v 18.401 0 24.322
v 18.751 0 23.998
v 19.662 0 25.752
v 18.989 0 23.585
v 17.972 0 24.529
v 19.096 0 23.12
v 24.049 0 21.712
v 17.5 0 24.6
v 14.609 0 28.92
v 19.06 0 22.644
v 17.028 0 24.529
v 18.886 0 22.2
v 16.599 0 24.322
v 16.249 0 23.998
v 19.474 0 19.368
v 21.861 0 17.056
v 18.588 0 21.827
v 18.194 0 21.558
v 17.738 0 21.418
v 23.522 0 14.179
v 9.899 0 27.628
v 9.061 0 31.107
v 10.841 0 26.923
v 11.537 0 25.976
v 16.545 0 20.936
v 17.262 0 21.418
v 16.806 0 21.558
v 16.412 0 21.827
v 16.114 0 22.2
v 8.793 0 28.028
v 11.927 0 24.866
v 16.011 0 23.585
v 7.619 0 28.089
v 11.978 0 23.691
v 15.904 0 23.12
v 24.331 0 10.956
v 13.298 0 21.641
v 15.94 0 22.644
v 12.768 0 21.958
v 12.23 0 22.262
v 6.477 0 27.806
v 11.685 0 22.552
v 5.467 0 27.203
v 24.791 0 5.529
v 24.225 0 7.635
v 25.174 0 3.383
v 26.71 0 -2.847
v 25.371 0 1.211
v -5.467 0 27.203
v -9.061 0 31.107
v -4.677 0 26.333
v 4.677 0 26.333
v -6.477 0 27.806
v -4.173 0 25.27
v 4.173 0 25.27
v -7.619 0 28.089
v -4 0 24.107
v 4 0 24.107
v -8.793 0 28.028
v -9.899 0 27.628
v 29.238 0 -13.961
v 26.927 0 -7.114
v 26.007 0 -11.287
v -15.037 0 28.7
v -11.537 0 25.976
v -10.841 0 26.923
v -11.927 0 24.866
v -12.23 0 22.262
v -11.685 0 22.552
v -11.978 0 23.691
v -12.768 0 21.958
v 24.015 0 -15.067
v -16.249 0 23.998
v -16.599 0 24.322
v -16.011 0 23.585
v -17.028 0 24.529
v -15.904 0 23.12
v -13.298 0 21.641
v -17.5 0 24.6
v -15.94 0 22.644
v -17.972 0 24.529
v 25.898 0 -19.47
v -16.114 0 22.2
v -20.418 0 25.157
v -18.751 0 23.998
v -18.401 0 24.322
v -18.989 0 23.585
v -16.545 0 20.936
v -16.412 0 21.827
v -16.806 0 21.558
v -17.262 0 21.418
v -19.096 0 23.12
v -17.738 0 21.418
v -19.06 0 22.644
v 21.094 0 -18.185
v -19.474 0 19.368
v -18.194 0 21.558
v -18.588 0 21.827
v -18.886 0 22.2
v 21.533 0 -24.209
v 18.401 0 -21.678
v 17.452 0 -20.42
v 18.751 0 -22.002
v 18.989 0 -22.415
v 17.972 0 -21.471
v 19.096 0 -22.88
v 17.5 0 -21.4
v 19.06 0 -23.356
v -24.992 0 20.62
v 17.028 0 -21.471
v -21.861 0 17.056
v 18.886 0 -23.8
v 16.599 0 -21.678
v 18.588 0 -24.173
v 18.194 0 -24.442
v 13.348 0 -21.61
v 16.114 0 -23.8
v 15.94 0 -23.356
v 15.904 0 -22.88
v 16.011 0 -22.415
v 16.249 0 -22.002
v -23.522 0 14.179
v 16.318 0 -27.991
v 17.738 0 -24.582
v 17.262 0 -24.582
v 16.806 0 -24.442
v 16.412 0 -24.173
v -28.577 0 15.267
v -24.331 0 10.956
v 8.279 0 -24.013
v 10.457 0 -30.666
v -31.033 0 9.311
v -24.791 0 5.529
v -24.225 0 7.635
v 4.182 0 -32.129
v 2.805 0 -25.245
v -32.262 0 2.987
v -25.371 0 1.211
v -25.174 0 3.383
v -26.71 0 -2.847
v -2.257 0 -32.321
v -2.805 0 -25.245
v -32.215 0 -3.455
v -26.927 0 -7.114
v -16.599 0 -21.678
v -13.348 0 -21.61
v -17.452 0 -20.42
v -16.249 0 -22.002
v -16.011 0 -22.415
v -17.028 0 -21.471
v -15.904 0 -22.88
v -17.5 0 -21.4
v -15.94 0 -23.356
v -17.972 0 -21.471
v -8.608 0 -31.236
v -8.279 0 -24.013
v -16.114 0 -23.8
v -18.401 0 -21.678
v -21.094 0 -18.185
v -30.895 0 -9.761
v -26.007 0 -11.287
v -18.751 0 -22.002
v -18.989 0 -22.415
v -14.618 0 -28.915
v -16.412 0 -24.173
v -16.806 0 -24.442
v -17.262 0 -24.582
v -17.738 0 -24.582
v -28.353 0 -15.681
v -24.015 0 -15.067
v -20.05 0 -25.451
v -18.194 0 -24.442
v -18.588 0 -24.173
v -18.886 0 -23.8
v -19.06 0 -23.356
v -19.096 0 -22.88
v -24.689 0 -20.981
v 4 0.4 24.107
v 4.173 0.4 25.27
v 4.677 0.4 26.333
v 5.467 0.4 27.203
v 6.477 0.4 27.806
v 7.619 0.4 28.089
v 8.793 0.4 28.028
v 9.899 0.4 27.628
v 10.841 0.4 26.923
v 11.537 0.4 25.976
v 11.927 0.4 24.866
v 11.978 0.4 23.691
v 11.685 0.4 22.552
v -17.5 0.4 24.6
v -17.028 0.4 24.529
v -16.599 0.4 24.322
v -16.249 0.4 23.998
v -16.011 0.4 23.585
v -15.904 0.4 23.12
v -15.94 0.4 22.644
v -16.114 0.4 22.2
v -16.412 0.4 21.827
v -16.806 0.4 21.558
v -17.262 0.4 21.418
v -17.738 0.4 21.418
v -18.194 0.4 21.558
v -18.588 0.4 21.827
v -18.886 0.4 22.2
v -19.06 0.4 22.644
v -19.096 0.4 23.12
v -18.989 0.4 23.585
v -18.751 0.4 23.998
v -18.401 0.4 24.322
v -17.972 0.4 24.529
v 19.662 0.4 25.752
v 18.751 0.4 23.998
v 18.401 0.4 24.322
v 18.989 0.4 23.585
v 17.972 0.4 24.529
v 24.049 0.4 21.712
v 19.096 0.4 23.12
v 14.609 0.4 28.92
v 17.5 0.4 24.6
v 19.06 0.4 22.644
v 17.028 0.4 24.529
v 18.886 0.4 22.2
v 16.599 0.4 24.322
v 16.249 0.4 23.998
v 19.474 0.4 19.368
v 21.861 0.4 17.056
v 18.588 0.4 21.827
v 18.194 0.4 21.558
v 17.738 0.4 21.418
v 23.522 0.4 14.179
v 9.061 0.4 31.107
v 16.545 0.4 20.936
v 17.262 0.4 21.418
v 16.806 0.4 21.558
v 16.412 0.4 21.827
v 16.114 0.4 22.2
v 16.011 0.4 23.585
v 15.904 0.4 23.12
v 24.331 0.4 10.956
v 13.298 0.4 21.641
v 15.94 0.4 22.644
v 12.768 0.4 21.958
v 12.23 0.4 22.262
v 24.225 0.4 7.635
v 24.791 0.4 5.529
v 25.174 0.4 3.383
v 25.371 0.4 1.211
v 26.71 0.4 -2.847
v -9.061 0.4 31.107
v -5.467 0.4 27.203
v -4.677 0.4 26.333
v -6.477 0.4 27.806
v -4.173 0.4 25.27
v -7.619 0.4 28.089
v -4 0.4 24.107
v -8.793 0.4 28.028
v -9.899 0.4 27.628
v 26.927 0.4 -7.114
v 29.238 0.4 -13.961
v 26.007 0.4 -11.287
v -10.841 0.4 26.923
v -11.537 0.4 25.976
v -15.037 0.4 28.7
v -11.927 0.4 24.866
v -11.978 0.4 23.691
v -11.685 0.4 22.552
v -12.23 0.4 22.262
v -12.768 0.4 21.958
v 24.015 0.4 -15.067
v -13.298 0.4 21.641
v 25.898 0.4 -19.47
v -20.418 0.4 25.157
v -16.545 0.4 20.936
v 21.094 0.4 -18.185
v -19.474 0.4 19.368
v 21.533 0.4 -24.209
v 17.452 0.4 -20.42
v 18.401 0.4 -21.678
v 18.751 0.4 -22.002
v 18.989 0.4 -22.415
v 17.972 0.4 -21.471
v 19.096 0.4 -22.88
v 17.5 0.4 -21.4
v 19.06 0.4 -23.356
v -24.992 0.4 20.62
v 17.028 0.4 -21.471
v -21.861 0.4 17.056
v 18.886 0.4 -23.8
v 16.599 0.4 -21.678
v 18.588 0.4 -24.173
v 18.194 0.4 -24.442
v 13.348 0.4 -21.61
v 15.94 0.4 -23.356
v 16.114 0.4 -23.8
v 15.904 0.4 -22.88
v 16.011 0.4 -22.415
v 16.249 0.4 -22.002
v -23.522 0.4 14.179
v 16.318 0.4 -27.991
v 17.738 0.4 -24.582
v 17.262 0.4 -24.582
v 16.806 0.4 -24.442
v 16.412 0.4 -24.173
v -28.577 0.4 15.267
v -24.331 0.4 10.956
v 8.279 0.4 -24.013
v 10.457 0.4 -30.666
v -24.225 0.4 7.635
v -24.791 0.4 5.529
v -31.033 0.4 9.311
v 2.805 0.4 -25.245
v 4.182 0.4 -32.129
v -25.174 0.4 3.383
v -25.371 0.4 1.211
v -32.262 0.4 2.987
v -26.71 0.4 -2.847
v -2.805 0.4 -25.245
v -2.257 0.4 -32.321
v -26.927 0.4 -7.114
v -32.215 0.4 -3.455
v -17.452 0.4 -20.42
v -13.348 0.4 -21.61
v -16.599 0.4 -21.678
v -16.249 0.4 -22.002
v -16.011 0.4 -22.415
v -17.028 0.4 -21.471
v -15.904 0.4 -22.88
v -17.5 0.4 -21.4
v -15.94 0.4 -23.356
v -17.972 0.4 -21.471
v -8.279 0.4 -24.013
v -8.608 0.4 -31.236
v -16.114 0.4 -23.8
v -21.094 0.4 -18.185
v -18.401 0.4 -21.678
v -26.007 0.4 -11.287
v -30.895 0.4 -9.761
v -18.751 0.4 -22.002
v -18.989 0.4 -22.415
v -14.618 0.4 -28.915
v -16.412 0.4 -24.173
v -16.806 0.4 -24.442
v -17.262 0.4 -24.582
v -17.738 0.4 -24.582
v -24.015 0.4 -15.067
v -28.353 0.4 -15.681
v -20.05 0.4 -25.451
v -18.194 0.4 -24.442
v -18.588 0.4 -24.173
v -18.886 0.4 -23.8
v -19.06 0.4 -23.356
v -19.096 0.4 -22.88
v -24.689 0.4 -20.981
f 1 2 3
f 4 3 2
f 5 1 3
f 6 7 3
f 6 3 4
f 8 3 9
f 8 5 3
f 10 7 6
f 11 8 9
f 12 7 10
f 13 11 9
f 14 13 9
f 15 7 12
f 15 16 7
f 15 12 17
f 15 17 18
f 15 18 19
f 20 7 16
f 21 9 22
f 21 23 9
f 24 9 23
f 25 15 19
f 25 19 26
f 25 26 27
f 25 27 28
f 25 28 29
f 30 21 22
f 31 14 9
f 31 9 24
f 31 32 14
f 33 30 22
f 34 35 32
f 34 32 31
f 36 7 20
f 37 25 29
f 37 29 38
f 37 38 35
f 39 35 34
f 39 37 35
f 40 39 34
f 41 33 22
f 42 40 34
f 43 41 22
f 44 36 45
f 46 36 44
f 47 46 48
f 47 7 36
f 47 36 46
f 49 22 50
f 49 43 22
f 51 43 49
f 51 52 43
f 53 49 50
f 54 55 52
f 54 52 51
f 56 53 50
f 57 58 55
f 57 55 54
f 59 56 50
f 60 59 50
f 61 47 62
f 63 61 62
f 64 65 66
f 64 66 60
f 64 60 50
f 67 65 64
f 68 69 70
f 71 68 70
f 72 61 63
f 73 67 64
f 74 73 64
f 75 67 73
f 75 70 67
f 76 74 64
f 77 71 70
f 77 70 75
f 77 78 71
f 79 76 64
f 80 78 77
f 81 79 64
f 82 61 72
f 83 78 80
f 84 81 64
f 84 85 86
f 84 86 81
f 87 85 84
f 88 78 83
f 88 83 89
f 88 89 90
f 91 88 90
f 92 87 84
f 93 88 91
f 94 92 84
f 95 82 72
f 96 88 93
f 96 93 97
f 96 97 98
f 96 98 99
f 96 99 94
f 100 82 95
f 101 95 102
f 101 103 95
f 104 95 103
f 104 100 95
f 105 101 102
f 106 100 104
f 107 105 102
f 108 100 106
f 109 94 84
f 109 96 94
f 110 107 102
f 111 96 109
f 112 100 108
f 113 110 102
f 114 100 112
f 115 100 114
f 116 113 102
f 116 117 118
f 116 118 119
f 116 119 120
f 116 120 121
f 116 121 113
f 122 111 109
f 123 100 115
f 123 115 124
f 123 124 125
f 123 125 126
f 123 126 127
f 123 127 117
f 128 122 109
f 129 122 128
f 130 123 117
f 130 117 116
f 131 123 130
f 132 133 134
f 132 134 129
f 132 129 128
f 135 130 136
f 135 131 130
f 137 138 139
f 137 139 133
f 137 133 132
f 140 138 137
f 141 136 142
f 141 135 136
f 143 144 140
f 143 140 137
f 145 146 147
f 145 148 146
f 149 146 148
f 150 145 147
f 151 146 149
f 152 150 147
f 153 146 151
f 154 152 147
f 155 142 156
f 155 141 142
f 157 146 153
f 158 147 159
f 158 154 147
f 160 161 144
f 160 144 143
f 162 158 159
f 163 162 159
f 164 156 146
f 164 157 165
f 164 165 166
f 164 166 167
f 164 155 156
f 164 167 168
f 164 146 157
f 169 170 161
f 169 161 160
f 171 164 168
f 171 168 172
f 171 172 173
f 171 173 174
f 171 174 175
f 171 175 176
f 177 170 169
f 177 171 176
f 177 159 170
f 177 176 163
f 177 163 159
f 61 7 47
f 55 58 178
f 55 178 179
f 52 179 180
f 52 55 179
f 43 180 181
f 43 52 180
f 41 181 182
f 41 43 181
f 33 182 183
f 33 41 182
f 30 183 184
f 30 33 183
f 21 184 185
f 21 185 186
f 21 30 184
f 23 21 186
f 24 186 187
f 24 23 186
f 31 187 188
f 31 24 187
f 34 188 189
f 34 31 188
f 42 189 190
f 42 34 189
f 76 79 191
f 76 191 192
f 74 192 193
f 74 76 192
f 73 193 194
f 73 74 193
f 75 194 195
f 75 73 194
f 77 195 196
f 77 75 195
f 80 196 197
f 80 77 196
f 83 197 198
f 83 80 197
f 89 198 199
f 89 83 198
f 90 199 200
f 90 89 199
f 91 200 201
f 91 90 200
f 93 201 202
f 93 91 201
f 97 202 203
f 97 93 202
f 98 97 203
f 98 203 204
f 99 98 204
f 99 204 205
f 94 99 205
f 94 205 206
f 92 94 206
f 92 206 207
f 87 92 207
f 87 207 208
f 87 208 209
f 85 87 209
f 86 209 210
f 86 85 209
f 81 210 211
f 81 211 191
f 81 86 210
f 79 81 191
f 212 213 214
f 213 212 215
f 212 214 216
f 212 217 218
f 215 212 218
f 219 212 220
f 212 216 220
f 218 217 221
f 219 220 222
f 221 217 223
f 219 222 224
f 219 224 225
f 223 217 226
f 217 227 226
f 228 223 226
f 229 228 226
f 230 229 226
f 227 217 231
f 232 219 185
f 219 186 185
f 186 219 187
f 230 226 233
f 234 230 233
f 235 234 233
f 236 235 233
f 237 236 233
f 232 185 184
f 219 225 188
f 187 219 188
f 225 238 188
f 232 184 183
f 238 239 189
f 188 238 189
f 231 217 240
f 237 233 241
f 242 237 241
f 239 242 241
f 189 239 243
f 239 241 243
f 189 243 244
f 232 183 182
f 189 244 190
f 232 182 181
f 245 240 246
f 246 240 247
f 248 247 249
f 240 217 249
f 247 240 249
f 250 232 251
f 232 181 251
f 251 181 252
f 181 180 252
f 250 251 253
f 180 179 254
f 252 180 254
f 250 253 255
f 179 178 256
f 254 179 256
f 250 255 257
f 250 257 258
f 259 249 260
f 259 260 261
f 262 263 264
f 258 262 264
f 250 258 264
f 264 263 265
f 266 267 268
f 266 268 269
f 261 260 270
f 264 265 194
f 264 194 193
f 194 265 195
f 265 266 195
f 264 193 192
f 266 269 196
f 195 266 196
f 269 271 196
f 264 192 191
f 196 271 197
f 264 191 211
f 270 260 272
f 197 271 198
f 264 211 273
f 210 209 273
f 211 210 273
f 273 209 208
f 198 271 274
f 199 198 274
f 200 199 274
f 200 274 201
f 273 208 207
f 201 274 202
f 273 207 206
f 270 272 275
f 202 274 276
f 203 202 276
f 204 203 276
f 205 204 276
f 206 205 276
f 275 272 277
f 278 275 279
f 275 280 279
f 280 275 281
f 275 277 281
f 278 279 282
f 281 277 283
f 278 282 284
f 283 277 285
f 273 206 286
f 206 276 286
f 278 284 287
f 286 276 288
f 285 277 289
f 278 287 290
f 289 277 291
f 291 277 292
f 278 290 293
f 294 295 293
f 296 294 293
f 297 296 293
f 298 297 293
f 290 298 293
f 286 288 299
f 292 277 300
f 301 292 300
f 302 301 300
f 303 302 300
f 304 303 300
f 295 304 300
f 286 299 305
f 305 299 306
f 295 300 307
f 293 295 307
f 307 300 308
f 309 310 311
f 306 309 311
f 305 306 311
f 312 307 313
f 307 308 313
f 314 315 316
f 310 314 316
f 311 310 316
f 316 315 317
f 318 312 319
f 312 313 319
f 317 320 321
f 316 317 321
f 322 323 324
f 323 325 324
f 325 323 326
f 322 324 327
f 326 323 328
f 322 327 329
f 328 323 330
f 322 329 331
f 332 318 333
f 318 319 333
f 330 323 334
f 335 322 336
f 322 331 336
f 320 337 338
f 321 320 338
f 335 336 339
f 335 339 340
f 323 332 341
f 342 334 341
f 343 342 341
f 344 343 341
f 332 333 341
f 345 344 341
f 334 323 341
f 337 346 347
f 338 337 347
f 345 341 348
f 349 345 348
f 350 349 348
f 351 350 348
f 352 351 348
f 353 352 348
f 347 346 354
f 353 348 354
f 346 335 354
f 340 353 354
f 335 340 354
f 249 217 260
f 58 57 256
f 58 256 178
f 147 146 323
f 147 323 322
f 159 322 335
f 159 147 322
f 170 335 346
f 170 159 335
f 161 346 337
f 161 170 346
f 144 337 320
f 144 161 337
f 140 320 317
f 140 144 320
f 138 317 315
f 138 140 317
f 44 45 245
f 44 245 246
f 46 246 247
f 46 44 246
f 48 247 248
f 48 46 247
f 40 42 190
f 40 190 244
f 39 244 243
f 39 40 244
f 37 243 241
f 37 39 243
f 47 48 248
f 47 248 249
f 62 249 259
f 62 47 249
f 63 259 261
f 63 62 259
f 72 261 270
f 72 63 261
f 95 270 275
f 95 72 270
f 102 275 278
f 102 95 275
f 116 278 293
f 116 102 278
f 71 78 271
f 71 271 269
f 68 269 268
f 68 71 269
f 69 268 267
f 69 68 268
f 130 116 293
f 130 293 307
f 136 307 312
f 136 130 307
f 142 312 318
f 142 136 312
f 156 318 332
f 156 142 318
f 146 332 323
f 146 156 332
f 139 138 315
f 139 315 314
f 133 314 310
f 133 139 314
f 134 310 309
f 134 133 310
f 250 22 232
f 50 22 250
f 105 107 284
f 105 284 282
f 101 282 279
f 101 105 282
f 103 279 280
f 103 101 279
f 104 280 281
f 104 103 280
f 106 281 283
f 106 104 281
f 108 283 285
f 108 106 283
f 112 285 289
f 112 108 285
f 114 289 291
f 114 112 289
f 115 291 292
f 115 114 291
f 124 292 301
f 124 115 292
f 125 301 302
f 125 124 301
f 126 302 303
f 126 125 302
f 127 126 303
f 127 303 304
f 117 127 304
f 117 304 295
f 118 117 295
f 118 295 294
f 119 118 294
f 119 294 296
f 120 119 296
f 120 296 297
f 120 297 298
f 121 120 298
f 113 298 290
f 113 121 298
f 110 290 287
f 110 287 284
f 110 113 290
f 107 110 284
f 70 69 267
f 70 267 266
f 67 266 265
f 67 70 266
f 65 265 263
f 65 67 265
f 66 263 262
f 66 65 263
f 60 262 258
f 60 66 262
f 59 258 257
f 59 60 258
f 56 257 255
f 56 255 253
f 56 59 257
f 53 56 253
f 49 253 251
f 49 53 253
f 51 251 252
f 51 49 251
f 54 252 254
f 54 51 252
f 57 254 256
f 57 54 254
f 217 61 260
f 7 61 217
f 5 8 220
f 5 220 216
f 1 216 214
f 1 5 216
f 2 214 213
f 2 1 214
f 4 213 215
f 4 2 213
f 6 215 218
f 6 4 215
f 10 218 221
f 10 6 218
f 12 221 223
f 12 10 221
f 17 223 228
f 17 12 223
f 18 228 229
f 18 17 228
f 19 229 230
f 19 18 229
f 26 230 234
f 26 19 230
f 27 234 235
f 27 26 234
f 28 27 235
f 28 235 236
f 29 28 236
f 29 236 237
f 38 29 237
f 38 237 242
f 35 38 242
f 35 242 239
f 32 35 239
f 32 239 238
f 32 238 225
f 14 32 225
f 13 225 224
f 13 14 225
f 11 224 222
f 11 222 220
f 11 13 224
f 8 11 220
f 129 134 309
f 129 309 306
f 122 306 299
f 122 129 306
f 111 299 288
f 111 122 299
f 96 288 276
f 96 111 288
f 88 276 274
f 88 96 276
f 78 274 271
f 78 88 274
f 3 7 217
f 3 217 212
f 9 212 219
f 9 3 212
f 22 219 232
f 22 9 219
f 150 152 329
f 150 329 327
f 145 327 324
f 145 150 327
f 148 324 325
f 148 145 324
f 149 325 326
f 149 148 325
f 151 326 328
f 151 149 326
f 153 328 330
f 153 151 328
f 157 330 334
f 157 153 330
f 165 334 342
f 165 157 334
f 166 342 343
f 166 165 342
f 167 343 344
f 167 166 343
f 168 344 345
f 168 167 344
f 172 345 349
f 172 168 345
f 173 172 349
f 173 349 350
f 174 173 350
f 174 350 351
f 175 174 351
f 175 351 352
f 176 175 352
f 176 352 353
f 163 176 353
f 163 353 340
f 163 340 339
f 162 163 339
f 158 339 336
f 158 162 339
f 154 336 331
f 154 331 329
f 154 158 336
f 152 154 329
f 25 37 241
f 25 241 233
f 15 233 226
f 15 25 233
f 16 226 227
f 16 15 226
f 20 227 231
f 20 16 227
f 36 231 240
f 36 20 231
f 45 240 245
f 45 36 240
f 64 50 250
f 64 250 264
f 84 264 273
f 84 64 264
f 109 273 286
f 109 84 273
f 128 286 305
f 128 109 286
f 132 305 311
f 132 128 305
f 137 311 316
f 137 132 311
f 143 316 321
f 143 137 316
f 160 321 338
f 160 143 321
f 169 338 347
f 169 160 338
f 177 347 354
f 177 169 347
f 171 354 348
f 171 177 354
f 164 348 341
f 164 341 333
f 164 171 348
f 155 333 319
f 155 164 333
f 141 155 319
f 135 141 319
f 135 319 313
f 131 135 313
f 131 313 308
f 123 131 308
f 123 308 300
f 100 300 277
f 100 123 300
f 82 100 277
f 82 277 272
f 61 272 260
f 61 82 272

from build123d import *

# Parameters (mm, degrees)
SKETCH1_R           = 1.6
BOSS_EXTRUDE1_DEPTH = 0.4


with BuildPart() as part:
    # Sketch1 → Boss-Extrude1 (new body)
    with BuildSketch(Plane(origin=(0, 0, 0), x_dir=(1, 0, 0), z_dir=(0, 1, 0))):
        with BuildLine():
            Line((29.237843605, 13.960963482), (24.049079653, -21.711788683))
            ThreePointArc((24.049079653, -21.711788683), (17.208573183, -27.452231403), (9.060814288, -31.107260317))
            Line((9.060814288, -31.107260317), (-9.060814288, -31.107260317))
            ThreePointArc((-9.060814288, -31.107260317), (-24.689356555, 20.980840614), (29.237843605, 13.960963482))
        make_face()
        with Locations(Location((-17.5, 23, 0), (0, 0, 270))):
            Circle(SKETCH1_R, mode=Mode.SUBTRACT)
        with Locations(Location((-17.5, -23, 0), (0, 0, 270))):
            Circle(SKETCH1_R, mode=Mode.SUBTRACT)
        with Locations(Location((17.5, -23, 0), (0, 0, 270))):
            Circle(SKETCH1_R, mode=Mode.SUBTRACT)
        with Locations(Location((17.5, 23, 0), (0, 0, 270))):
            Circle(SKETCH1_R, mode=Mode.SUBTRACT)
        with BuildLine():
            Line((-4, -24.107260317), (4, -24.107260317))
            ThreePointArc((4, -24.107260317), (8.793181532, -28.027829543), (11.685431528, -22.552398764))
            ThreePointArc((11.685431528, -22.552398764), (12.499954018, -22.111335318), (13.297853098, -21.640866502))
            ThreePointArc((13.297853098, -21.640866502), (21.8608918, -17.056148201), (24.225281505, -7.63516444))
            ThreePointArc((24.225281505, -7.63516444), (25.005340406, -4.460151477), (25.371103528, -1.211241423))
            ThreePointArc((25.371103528, -1.211241423), (25.13782952, 13.24356348), (13.348031622, 21.609952611))
            ThreePointArc((13.348031622, 21.609952611), (0, 25.4), (-13.348031622, 21.609952611))
            ThreePointArc((-13.348031622, 21.609952611), (-25.13782952, 13.24356348), (-25.371103528, -1.211241423))
            ThreePointArc((-25.371103528, -1.211241423), (-25.005340406, -4.460151477), (-24.225281505, -7.63516444))
            ThreePointArc((-24.225281505, -7.63516444), (-21.8608918, -17.056148201), (-13.297853098, -21.640866502))
            ThreePointArc((-13.297853098, -21.640866502), (-12.499954018, -22.111335318), (-11.685431528, -22.552398764))
            ThreePointArc((-11.685431528, -22.552398764), (-8.793181532, -28.027829543), (-4, -24.107260317))
        make_face(mode=Mode.SUBTRACT)
    extrude(amount=BOSS_EXTRUDE1_DEPTH)


solid = part.part
